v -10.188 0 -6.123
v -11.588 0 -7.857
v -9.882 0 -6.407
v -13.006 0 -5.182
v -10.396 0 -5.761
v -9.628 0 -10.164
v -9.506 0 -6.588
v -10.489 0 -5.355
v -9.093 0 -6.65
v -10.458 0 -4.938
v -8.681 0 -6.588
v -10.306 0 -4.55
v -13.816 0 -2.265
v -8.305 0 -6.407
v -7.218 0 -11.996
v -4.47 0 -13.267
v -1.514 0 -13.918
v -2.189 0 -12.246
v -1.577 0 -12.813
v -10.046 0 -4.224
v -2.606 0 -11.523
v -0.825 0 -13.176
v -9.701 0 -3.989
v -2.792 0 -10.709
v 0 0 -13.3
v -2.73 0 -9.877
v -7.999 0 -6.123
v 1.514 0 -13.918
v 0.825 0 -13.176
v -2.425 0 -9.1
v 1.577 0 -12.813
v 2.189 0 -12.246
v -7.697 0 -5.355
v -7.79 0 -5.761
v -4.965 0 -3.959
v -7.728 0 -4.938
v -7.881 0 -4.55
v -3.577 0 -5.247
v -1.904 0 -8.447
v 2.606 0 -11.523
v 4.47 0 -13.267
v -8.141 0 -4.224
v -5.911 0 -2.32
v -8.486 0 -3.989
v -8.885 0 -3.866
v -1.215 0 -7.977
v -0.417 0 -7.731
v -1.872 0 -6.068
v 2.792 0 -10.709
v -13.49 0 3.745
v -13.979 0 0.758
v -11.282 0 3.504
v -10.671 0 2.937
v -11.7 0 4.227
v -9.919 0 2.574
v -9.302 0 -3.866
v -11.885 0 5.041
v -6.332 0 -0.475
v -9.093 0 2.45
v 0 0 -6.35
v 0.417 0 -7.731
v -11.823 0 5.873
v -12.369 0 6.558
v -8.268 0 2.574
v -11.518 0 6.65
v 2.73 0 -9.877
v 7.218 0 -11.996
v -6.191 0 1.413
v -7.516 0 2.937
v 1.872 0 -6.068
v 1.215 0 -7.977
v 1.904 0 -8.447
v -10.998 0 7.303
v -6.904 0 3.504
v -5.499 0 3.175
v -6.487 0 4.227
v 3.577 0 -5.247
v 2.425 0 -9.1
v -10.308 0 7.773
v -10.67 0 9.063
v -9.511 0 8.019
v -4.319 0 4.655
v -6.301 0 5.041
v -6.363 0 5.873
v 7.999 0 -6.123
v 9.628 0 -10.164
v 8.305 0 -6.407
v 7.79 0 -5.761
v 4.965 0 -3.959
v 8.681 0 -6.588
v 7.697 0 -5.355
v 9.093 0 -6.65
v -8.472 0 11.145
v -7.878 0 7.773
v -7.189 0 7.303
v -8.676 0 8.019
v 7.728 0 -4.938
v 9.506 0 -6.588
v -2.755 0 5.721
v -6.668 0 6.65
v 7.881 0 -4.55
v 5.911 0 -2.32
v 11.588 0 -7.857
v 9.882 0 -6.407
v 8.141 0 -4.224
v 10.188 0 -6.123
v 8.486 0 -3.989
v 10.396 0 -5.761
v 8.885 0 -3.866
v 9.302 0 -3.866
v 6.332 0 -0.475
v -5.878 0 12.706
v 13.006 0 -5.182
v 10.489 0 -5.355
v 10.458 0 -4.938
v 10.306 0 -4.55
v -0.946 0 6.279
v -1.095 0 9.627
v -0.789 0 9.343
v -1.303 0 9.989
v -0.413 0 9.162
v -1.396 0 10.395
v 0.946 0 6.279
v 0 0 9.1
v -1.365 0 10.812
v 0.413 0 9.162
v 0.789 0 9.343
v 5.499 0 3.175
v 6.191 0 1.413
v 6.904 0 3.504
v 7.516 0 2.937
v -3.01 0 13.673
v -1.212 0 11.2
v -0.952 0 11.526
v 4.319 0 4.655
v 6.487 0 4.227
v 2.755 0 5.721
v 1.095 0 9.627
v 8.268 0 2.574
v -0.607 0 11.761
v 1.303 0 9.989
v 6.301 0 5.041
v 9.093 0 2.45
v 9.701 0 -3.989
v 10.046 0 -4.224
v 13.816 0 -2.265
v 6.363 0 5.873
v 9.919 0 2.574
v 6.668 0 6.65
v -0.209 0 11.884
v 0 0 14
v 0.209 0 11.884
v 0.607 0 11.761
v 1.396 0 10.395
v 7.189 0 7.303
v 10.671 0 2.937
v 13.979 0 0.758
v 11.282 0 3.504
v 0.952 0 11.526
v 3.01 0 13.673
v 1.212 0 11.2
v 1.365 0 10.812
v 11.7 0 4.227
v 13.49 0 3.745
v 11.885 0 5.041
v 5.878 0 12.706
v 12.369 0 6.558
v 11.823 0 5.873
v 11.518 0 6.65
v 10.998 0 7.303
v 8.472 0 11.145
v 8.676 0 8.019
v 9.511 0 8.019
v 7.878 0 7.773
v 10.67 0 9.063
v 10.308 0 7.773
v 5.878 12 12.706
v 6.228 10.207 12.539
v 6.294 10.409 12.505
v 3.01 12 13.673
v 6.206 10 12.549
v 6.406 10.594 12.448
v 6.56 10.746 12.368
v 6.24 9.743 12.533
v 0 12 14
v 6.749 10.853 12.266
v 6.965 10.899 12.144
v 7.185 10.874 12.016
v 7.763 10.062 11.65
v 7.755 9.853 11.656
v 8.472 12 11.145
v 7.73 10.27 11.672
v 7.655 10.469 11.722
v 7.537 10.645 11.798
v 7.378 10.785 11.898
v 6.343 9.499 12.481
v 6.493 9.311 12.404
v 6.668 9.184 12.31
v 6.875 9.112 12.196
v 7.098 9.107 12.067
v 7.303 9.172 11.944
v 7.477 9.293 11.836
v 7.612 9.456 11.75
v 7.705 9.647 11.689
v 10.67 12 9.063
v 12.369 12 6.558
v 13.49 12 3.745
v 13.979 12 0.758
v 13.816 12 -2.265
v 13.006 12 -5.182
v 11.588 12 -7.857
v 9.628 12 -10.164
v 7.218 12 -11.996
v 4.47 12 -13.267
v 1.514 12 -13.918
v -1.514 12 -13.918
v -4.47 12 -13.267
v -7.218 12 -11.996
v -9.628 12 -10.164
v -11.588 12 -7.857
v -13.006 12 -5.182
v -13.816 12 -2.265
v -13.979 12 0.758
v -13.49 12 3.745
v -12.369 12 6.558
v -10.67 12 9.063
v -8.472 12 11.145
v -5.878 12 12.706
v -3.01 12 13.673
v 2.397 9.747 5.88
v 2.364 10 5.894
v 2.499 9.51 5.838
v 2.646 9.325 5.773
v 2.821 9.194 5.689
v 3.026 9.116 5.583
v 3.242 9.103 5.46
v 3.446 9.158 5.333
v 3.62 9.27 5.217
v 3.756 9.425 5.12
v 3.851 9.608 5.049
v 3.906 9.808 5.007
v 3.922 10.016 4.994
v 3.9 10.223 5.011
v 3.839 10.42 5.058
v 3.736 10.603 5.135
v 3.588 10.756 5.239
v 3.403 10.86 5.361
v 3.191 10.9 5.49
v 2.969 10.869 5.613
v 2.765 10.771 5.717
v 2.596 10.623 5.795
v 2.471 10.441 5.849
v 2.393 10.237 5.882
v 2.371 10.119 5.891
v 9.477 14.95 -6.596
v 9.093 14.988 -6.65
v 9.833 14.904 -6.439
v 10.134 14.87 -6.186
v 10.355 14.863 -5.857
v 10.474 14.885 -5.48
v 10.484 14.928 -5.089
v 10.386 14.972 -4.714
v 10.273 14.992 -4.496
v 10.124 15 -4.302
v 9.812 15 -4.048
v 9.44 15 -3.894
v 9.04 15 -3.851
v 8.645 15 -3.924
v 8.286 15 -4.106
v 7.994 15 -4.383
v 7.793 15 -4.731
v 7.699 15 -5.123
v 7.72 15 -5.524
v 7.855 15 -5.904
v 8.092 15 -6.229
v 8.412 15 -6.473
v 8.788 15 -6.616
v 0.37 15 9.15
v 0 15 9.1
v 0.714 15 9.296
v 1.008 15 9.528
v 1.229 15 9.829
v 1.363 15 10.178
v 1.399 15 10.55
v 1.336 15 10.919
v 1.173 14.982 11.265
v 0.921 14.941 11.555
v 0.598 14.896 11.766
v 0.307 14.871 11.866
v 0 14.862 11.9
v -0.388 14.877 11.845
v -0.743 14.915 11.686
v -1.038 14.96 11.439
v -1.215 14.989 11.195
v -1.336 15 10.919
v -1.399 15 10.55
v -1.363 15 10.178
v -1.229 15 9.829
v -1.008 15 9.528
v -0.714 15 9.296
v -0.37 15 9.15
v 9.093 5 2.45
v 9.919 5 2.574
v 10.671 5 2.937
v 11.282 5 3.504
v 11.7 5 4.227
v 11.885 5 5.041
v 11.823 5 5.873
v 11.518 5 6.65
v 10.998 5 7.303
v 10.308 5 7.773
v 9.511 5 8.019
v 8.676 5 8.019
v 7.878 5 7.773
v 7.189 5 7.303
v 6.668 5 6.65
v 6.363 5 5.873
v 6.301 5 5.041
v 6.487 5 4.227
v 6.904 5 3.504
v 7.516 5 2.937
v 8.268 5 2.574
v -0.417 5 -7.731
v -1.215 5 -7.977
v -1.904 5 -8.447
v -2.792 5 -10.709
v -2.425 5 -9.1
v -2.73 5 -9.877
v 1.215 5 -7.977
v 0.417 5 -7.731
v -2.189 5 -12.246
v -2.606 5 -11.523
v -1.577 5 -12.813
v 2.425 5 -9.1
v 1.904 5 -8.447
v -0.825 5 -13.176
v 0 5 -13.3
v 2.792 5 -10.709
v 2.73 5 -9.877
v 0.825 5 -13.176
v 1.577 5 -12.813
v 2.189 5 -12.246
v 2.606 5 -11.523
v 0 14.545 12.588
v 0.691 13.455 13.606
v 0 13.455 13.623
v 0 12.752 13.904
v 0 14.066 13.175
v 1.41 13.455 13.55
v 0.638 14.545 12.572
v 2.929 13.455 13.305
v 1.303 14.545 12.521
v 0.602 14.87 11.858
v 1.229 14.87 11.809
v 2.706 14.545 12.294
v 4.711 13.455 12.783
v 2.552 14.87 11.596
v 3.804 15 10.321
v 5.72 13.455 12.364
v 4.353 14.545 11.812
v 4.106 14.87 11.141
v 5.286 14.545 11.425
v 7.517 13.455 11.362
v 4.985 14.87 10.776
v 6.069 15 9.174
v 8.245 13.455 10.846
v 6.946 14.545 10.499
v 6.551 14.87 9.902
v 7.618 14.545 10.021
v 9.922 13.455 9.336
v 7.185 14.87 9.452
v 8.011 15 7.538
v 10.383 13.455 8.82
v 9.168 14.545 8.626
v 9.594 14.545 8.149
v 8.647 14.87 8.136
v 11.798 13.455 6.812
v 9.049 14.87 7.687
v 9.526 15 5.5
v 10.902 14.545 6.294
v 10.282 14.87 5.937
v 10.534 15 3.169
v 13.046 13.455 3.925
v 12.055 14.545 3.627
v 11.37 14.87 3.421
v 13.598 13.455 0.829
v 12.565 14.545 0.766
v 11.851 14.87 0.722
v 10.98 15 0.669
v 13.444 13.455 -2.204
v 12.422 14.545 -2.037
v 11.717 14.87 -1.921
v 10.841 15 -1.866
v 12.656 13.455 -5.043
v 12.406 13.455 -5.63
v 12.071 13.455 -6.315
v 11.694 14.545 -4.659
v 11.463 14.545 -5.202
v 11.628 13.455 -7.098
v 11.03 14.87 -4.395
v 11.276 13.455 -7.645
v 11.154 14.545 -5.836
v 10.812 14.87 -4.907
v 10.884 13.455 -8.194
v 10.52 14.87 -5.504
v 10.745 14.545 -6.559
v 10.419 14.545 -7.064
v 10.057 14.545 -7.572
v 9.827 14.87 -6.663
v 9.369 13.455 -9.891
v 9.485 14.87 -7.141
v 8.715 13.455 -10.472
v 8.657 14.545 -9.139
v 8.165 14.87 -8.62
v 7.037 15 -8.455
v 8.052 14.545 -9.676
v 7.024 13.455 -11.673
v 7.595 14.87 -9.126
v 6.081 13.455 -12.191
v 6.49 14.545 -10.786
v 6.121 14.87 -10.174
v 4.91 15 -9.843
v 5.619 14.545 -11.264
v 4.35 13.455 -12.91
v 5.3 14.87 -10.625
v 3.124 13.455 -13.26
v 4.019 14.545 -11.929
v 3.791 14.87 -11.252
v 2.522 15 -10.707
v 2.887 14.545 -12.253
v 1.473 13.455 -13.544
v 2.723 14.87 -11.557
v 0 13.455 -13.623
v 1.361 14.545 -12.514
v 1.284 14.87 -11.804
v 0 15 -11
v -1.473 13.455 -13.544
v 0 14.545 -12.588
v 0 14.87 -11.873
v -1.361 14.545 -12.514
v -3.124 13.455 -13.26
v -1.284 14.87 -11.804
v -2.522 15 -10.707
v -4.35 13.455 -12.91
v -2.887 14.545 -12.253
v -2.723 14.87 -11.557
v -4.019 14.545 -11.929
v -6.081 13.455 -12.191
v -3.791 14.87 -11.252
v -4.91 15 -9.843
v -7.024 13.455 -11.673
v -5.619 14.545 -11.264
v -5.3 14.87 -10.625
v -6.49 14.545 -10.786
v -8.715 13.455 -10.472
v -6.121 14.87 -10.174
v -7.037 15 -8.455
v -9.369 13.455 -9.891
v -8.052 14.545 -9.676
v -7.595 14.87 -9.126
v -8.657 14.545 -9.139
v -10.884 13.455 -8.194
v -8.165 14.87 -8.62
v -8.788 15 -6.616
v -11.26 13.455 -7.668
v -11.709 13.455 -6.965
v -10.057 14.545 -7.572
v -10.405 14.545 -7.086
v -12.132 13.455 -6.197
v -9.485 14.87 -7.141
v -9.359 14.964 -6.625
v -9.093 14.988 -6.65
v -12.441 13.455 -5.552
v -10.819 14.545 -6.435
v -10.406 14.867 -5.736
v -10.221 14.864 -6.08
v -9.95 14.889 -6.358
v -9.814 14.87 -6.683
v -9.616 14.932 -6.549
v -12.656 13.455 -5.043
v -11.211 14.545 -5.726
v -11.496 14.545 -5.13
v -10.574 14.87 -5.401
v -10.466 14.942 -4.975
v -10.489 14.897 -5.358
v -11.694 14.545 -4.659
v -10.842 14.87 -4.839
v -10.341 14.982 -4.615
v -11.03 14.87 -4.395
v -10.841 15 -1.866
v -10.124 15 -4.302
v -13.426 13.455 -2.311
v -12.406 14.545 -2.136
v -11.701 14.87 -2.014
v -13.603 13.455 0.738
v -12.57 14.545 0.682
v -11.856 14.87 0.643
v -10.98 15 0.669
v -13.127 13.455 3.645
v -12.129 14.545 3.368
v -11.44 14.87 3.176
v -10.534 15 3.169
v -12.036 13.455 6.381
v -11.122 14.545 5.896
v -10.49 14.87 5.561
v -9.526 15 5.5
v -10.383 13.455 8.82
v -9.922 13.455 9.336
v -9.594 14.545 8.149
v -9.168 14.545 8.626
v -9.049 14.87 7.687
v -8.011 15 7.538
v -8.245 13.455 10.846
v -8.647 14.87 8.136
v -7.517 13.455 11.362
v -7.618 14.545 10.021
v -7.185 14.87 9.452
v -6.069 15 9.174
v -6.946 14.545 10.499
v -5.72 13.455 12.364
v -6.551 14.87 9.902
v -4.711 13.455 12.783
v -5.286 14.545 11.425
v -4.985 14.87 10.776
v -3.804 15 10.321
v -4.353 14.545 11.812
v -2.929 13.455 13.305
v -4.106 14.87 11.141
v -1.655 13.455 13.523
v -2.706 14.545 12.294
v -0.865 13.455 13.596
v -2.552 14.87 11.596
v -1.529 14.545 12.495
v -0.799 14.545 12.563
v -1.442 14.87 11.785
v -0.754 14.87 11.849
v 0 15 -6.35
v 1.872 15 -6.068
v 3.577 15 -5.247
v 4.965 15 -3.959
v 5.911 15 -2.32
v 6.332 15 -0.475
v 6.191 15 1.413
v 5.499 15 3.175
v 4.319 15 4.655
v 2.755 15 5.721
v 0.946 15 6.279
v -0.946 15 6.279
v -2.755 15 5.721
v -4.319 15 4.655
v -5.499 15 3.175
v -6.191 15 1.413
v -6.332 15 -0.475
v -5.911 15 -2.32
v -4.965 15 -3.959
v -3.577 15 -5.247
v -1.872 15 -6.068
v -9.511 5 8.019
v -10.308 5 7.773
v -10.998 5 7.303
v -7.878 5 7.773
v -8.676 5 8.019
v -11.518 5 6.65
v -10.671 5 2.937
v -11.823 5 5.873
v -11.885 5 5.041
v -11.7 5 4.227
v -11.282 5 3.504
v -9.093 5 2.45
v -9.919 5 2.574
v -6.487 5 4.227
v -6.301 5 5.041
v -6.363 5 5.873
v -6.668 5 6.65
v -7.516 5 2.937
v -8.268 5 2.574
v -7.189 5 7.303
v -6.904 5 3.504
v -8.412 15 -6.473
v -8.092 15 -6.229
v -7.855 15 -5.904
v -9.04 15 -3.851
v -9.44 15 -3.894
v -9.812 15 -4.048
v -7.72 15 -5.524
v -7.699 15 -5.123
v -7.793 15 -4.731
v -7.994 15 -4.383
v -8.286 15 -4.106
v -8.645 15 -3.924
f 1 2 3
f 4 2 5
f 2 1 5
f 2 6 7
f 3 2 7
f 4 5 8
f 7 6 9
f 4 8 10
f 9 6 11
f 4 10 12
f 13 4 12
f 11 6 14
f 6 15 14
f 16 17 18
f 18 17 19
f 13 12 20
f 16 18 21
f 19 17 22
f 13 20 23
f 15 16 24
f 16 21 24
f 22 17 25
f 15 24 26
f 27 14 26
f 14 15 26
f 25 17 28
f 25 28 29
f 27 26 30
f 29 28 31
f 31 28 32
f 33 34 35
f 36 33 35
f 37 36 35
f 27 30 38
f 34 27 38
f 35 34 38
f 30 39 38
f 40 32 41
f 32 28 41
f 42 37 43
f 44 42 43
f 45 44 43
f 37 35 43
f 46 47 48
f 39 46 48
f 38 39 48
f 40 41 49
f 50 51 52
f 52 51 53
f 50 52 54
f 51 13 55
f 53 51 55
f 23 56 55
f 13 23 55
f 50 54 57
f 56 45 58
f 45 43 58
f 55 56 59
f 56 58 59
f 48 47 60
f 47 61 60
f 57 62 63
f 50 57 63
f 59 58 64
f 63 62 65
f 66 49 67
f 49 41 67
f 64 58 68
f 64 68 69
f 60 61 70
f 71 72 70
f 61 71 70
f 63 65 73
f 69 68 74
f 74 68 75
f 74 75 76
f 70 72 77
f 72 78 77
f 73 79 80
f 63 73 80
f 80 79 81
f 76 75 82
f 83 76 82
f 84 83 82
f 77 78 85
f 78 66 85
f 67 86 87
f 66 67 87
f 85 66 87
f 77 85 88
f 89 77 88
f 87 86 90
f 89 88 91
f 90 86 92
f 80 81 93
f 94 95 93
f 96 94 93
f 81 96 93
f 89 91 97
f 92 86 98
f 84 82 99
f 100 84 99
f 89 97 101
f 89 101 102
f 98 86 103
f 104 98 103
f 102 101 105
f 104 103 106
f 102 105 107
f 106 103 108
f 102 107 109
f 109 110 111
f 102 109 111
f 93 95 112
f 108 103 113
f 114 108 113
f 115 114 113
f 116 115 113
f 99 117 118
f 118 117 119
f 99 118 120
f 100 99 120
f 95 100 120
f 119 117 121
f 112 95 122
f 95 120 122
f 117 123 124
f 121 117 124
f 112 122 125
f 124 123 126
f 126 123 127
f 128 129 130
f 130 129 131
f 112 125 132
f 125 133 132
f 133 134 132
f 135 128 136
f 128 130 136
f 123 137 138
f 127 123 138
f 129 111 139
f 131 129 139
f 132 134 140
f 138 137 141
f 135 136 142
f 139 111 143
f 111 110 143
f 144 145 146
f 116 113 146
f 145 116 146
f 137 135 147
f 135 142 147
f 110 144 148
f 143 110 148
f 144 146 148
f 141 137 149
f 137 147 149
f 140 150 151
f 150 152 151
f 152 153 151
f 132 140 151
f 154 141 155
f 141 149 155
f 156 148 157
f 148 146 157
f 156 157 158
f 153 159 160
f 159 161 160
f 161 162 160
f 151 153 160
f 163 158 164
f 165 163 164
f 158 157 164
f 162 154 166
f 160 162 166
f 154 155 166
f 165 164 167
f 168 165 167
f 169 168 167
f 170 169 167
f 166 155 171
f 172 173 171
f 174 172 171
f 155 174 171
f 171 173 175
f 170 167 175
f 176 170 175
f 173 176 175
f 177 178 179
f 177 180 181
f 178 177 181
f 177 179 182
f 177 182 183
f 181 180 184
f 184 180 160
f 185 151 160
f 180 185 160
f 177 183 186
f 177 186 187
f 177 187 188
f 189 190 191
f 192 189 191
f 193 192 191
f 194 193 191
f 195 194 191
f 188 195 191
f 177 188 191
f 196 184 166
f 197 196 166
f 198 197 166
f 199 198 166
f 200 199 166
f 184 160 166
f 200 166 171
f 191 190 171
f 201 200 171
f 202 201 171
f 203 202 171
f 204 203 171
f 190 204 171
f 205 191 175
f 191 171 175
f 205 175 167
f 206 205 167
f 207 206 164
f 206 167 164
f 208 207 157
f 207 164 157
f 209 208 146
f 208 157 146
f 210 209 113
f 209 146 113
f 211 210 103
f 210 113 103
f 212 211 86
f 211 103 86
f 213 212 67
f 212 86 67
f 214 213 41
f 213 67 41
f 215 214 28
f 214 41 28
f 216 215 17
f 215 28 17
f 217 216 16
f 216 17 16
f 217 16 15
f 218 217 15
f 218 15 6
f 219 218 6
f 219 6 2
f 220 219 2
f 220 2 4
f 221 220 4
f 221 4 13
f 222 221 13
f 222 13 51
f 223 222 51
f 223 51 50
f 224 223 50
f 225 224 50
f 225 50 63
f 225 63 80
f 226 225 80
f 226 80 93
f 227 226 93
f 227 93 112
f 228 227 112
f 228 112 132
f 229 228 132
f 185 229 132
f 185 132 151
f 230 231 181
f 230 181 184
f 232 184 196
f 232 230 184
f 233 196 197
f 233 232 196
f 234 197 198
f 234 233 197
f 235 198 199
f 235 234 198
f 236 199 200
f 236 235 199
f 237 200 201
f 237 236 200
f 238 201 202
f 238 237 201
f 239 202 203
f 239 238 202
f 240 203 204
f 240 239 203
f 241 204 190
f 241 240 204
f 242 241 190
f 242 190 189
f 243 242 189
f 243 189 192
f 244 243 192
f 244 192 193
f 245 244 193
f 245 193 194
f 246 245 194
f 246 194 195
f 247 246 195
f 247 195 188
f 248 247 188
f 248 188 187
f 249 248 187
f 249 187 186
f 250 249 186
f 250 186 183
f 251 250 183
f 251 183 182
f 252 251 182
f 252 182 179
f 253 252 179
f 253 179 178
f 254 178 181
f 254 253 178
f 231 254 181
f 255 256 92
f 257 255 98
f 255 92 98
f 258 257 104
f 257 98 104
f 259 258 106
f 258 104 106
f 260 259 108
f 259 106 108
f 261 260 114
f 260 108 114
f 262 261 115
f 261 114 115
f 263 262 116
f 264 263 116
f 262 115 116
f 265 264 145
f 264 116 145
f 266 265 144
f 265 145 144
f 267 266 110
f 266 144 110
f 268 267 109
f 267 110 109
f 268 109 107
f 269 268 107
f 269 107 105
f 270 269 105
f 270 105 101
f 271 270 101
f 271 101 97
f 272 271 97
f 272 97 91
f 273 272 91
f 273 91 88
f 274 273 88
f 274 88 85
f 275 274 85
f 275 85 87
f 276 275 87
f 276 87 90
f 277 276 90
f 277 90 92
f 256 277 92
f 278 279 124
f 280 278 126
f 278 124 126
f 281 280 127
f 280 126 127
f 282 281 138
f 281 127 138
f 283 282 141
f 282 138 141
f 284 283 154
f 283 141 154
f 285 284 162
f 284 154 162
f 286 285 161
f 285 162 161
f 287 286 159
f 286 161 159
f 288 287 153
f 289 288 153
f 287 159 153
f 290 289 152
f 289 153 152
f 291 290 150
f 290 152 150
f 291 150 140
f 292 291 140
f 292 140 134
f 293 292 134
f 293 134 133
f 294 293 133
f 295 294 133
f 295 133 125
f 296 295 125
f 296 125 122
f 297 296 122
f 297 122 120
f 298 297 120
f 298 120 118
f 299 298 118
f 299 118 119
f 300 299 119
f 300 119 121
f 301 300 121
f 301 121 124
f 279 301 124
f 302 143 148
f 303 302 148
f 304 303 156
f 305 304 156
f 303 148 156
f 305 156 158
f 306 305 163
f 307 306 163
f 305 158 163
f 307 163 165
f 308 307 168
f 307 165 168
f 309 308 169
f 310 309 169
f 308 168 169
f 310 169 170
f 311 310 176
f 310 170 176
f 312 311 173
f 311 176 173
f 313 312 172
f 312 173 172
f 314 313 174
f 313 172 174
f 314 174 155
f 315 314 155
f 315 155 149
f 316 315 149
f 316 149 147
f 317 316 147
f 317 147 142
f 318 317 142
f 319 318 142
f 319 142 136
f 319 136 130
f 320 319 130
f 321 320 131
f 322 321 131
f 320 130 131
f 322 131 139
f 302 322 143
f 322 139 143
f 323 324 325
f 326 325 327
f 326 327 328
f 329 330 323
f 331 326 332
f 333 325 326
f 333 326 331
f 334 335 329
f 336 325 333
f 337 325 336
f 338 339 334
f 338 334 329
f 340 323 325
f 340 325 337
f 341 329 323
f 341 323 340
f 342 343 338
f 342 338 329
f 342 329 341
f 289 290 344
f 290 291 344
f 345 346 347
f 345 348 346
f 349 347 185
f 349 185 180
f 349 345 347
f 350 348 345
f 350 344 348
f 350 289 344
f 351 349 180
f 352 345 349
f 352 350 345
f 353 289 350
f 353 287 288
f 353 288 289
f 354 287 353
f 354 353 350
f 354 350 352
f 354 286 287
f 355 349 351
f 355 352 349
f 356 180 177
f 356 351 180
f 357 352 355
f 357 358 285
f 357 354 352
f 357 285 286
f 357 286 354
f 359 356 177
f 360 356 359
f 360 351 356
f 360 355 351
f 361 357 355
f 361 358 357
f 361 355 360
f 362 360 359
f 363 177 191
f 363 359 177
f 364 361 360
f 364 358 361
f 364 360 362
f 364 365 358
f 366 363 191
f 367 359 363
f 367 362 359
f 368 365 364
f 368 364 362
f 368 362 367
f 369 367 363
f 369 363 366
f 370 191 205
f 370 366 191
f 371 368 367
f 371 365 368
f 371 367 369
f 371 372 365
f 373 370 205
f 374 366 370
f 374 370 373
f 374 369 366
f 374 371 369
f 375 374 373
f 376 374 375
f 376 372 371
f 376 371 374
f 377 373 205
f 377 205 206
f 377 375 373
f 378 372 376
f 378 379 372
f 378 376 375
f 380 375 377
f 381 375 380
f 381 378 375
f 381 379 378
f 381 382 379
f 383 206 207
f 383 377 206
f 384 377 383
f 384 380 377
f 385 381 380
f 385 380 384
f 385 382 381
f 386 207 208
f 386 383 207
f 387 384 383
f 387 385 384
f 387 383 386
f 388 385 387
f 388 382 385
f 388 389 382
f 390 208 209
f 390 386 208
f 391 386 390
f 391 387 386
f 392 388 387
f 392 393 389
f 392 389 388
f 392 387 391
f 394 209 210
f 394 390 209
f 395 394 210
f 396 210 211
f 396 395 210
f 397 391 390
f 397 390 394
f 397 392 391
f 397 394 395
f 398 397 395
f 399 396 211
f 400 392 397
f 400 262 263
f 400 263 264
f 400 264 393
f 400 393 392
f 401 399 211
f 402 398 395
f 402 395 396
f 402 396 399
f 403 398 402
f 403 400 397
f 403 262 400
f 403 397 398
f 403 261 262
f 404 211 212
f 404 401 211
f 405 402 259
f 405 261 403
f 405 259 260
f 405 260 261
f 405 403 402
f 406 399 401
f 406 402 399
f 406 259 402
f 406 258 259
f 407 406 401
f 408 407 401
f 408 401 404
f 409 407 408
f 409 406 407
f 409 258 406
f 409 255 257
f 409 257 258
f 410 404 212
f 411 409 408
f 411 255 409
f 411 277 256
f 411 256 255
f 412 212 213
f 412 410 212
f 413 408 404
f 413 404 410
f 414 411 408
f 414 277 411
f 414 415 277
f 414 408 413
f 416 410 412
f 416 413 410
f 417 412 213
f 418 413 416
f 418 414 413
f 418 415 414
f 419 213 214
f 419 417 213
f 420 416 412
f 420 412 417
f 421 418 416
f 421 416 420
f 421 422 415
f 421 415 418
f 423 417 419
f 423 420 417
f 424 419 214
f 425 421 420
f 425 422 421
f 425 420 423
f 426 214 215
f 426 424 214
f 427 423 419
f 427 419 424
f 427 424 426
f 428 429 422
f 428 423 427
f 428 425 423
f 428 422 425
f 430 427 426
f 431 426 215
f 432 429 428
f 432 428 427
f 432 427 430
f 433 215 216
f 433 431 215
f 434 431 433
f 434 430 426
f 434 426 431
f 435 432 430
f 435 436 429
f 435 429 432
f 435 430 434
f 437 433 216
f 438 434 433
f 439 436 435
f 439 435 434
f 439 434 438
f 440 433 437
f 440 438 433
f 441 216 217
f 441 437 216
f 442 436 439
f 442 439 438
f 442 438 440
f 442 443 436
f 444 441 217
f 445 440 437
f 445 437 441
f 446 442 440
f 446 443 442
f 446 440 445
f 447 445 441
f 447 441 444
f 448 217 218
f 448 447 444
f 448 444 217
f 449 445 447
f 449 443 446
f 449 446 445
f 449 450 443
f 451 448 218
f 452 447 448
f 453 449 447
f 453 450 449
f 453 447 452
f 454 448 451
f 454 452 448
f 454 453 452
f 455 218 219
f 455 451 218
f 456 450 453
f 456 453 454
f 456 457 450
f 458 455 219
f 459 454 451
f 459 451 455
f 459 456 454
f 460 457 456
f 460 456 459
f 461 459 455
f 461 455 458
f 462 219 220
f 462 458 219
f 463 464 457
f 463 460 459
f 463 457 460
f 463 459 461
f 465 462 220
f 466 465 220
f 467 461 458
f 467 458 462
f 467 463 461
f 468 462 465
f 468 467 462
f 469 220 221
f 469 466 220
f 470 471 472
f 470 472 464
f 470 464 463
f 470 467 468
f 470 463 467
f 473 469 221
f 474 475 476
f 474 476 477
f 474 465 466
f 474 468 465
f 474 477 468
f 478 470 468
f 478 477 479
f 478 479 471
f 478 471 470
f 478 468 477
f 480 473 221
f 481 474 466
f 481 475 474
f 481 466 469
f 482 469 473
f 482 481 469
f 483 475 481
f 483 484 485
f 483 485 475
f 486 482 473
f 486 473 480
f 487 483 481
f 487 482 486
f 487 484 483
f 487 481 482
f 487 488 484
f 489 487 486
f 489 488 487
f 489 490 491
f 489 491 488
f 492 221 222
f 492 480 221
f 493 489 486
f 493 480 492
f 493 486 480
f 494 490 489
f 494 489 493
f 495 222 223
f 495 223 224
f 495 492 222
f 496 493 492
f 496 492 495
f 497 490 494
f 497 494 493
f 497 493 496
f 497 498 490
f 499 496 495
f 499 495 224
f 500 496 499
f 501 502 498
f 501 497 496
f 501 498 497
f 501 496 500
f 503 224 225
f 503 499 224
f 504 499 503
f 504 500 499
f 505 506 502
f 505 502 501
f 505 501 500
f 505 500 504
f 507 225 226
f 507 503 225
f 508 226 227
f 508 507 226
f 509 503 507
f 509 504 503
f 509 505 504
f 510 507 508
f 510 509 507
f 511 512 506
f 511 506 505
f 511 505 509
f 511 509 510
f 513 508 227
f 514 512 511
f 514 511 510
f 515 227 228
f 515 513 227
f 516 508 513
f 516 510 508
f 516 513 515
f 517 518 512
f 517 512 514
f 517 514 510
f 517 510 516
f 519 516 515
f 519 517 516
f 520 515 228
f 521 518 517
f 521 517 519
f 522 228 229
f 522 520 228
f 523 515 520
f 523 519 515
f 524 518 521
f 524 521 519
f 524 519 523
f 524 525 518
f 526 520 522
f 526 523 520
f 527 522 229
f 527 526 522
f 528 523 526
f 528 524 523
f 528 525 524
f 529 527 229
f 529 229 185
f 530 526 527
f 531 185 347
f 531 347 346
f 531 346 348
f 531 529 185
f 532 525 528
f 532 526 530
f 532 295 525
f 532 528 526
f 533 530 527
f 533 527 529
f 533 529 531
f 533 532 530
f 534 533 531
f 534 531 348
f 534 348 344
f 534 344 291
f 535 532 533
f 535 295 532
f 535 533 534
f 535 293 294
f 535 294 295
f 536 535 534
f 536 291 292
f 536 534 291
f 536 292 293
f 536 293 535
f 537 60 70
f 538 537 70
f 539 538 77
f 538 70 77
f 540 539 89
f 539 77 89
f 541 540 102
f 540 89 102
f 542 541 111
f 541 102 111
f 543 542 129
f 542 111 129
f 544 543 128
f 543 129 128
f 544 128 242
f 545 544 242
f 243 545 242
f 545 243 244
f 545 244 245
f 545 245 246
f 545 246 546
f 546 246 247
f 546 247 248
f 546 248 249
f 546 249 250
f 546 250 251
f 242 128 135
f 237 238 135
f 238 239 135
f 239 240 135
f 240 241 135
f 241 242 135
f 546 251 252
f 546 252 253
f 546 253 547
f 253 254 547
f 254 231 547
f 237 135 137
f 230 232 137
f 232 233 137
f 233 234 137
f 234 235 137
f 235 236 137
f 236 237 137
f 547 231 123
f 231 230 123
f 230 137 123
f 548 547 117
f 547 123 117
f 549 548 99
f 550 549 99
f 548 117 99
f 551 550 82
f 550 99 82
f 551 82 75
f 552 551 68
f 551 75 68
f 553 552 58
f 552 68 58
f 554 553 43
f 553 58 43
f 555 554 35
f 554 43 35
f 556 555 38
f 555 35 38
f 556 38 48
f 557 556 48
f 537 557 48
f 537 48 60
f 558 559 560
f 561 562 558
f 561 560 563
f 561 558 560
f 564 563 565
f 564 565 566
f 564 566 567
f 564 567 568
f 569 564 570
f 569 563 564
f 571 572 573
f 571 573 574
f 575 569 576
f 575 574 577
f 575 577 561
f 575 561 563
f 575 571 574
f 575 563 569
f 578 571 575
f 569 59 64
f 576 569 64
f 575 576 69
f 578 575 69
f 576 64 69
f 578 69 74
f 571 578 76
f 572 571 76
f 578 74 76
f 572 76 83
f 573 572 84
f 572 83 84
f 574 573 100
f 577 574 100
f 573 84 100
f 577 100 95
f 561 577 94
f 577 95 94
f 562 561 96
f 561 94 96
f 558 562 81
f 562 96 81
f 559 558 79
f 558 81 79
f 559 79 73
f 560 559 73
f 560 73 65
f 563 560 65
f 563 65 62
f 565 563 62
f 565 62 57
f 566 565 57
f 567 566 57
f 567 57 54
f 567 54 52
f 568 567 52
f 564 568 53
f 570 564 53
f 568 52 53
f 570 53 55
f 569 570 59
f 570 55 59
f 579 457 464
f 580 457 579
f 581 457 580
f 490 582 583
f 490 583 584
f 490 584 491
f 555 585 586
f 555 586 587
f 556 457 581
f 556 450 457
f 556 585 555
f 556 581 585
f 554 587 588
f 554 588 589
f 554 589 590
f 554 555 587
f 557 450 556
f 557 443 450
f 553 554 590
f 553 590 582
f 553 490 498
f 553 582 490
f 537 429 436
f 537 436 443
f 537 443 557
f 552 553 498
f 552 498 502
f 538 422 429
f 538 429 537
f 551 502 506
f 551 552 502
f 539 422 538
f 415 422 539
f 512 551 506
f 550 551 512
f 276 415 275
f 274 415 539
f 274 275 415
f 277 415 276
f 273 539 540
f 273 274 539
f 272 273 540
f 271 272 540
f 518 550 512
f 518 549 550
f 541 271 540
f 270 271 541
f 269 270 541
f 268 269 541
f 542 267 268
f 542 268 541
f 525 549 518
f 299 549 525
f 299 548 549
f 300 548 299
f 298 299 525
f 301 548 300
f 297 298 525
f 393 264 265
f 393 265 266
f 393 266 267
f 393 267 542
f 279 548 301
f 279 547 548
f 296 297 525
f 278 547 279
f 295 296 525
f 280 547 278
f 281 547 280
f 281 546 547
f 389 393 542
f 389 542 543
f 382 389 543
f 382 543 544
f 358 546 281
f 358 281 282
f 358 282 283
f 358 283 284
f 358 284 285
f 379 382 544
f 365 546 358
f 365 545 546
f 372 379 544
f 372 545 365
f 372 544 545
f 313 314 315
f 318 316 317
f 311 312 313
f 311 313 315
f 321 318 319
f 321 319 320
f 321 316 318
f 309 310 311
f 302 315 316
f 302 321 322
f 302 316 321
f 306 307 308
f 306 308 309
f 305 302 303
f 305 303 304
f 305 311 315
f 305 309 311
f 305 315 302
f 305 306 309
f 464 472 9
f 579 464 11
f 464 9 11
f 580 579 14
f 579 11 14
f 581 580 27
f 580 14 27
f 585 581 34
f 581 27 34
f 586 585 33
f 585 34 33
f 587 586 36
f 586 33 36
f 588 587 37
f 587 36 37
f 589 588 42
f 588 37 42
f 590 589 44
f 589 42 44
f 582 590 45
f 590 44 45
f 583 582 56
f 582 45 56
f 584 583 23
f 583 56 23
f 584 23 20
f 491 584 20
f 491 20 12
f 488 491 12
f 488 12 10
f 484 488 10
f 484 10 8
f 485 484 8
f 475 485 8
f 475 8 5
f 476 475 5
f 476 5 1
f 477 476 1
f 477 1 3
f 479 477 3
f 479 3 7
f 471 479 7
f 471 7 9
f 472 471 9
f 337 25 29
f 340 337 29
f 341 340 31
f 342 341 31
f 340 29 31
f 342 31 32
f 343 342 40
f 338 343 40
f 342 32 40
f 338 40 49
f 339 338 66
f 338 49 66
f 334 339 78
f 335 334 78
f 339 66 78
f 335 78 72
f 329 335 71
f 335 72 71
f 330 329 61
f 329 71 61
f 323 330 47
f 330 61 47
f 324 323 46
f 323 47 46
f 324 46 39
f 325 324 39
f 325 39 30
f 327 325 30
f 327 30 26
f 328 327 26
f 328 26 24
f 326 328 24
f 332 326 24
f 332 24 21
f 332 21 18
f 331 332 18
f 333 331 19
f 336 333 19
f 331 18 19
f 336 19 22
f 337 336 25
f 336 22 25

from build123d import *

# Parameters (mm, degrees)
SKETCH1_R               = 14
BOSS_EXTRUDE1_DEPTH     = 15
SKETCH2_R               = 1.4
SKETCH2_R_2             = 6.35
CUT_EXTRUDE1_DEPTH      = 25.839484697
BOSS_EXTRUDE2_DEPTH     = 2
CUT_EXTRUDE2_DEPTH      = 17
CUT_EXTRUDE2_DEPTH_BACK = 10
SKETCH4_R               = 0.9
SKETCH4_W               = 10.5
SKETCH4_H               = 2
SKETCH5_R               = 2.8
CUT_EXTRUDE3_DEPTH      = 5
FILLET1_R               = 3


with BuildPart() as part:
    # Sketch1 → Boss-Extrude1 (new body)
    with BuildSketch(Plane(origin=(0, 0, 0), x_dir=(1, 0, 0), z_dir=(0, 1, 0))):
        with Locations(Location((0, 0, 0), (0, 0, 270))):
            Circle(SKETCH1_R)
    extrude(amount=BOSS_EXTRUDE1_DEPTH)

    # Sketch2 → Cut-Extrude1 (cut, through all)
    with BuildSketch(Plane.XZ):
        with Locations(Location((0, 10.5, 0), (0, 0, 270))):
            Circle(SKETCH2_R)
        with Locations(Location((0, 0, 0), (0, 0, 270))):
            Circle(SKETCH2_R_2)
        with Locations(Location((9.09326674, -5.25, 0), (0, 0, 270))):
            Circle(SKETCH2_R)
        with Locations(Location((-9.09326674, -5.25, 0), (0, 0, 270))):
            Circle(SKETCH2_R)
    extrude(amount=-CUT_EXTRUDE1_DEPTH, mode=Mode.SUBTRACT)

    # Sketch3 → Boss-Extrude2 (add)
    with BuildSketch(Plane(origin=(0, 0, 0), x_dir=(1, 0, 0), z_dir=(0, 1, 0))):
        Polygon((0, 0), (9.09326674, -5.25), (0, -10.5), align=None)
    extrude(amount=-BOSS_EXTRUDE2_DEPTH)

    # Sketch4 → Cut-Extrude2 (cut, two sides: drawn at the far end of the back side and taken through both)
    with BuildSketch(Plane(origin=(4.54663337, 0, 7.875), x_dir=(0.8660254037844364, 0, -0.5000000000000041), z_dir=(0.500000000000004, 0, 0.8660254037844363)).offset(-CUT_EXTRUDE2_DEPTH_BACK)):
        with Locations(Location((0, 10, 0), (0, 0, 180))):
            Circle(SKETCH4_R)
        with Locations((0, -1)):
            Rectangle(SKETCH4_W, SKETCH4_H)
    extrude(amount=CUT_EXTRUDE2_DEPTH + CUT_EXTRUDE2_DEPTH_BACK, mode=Mode.SUBTRACT)

    # Sketch5 → Cut-Extrude3 (cut)
    with BuildSketch(Plane.XZ):
        with Locations(Location((9.09326674, 5.25, 0), (0, 0, 270))):
            Circle(SKETCH5_R)
        with Locations(Location((0, -10.5, 0), (0, 0, 270))):
            Circle(SKETCH5_R)
        with Locations(Location((-9.09326674, 5.25, 0), (0, 0, 270))):
            Circle(SKETCH5_R)
    extrude(amount=-CUT_EXTRUDE3_DEPTH, mode=Mode.SUBTRACT)

    # Fillet1
    # the kernel refuses this fillet: 3 mm, written as the material it takes off along each edge
    with BuildSketch(Plane(origin=(0, 15, 0), x_dir=(0, 0, 1), z_dir=(-1, 0, 0))) as fillet1_piece_1:
        with BuildLine():
            CenterArc((14 - FILLET1_R, -FILLET1_R), FILLET1_R, 0, 90)
            Line((14 - FILLET1_R, 0), (14, 0))
            Line((14, 0), (14, -FILLET1_R))
        make_face()
    revolve(axis=Axis((0, 15, 0), (0, 1, 0)), mode=Mode.SUBTRACT)


solid = part.part
